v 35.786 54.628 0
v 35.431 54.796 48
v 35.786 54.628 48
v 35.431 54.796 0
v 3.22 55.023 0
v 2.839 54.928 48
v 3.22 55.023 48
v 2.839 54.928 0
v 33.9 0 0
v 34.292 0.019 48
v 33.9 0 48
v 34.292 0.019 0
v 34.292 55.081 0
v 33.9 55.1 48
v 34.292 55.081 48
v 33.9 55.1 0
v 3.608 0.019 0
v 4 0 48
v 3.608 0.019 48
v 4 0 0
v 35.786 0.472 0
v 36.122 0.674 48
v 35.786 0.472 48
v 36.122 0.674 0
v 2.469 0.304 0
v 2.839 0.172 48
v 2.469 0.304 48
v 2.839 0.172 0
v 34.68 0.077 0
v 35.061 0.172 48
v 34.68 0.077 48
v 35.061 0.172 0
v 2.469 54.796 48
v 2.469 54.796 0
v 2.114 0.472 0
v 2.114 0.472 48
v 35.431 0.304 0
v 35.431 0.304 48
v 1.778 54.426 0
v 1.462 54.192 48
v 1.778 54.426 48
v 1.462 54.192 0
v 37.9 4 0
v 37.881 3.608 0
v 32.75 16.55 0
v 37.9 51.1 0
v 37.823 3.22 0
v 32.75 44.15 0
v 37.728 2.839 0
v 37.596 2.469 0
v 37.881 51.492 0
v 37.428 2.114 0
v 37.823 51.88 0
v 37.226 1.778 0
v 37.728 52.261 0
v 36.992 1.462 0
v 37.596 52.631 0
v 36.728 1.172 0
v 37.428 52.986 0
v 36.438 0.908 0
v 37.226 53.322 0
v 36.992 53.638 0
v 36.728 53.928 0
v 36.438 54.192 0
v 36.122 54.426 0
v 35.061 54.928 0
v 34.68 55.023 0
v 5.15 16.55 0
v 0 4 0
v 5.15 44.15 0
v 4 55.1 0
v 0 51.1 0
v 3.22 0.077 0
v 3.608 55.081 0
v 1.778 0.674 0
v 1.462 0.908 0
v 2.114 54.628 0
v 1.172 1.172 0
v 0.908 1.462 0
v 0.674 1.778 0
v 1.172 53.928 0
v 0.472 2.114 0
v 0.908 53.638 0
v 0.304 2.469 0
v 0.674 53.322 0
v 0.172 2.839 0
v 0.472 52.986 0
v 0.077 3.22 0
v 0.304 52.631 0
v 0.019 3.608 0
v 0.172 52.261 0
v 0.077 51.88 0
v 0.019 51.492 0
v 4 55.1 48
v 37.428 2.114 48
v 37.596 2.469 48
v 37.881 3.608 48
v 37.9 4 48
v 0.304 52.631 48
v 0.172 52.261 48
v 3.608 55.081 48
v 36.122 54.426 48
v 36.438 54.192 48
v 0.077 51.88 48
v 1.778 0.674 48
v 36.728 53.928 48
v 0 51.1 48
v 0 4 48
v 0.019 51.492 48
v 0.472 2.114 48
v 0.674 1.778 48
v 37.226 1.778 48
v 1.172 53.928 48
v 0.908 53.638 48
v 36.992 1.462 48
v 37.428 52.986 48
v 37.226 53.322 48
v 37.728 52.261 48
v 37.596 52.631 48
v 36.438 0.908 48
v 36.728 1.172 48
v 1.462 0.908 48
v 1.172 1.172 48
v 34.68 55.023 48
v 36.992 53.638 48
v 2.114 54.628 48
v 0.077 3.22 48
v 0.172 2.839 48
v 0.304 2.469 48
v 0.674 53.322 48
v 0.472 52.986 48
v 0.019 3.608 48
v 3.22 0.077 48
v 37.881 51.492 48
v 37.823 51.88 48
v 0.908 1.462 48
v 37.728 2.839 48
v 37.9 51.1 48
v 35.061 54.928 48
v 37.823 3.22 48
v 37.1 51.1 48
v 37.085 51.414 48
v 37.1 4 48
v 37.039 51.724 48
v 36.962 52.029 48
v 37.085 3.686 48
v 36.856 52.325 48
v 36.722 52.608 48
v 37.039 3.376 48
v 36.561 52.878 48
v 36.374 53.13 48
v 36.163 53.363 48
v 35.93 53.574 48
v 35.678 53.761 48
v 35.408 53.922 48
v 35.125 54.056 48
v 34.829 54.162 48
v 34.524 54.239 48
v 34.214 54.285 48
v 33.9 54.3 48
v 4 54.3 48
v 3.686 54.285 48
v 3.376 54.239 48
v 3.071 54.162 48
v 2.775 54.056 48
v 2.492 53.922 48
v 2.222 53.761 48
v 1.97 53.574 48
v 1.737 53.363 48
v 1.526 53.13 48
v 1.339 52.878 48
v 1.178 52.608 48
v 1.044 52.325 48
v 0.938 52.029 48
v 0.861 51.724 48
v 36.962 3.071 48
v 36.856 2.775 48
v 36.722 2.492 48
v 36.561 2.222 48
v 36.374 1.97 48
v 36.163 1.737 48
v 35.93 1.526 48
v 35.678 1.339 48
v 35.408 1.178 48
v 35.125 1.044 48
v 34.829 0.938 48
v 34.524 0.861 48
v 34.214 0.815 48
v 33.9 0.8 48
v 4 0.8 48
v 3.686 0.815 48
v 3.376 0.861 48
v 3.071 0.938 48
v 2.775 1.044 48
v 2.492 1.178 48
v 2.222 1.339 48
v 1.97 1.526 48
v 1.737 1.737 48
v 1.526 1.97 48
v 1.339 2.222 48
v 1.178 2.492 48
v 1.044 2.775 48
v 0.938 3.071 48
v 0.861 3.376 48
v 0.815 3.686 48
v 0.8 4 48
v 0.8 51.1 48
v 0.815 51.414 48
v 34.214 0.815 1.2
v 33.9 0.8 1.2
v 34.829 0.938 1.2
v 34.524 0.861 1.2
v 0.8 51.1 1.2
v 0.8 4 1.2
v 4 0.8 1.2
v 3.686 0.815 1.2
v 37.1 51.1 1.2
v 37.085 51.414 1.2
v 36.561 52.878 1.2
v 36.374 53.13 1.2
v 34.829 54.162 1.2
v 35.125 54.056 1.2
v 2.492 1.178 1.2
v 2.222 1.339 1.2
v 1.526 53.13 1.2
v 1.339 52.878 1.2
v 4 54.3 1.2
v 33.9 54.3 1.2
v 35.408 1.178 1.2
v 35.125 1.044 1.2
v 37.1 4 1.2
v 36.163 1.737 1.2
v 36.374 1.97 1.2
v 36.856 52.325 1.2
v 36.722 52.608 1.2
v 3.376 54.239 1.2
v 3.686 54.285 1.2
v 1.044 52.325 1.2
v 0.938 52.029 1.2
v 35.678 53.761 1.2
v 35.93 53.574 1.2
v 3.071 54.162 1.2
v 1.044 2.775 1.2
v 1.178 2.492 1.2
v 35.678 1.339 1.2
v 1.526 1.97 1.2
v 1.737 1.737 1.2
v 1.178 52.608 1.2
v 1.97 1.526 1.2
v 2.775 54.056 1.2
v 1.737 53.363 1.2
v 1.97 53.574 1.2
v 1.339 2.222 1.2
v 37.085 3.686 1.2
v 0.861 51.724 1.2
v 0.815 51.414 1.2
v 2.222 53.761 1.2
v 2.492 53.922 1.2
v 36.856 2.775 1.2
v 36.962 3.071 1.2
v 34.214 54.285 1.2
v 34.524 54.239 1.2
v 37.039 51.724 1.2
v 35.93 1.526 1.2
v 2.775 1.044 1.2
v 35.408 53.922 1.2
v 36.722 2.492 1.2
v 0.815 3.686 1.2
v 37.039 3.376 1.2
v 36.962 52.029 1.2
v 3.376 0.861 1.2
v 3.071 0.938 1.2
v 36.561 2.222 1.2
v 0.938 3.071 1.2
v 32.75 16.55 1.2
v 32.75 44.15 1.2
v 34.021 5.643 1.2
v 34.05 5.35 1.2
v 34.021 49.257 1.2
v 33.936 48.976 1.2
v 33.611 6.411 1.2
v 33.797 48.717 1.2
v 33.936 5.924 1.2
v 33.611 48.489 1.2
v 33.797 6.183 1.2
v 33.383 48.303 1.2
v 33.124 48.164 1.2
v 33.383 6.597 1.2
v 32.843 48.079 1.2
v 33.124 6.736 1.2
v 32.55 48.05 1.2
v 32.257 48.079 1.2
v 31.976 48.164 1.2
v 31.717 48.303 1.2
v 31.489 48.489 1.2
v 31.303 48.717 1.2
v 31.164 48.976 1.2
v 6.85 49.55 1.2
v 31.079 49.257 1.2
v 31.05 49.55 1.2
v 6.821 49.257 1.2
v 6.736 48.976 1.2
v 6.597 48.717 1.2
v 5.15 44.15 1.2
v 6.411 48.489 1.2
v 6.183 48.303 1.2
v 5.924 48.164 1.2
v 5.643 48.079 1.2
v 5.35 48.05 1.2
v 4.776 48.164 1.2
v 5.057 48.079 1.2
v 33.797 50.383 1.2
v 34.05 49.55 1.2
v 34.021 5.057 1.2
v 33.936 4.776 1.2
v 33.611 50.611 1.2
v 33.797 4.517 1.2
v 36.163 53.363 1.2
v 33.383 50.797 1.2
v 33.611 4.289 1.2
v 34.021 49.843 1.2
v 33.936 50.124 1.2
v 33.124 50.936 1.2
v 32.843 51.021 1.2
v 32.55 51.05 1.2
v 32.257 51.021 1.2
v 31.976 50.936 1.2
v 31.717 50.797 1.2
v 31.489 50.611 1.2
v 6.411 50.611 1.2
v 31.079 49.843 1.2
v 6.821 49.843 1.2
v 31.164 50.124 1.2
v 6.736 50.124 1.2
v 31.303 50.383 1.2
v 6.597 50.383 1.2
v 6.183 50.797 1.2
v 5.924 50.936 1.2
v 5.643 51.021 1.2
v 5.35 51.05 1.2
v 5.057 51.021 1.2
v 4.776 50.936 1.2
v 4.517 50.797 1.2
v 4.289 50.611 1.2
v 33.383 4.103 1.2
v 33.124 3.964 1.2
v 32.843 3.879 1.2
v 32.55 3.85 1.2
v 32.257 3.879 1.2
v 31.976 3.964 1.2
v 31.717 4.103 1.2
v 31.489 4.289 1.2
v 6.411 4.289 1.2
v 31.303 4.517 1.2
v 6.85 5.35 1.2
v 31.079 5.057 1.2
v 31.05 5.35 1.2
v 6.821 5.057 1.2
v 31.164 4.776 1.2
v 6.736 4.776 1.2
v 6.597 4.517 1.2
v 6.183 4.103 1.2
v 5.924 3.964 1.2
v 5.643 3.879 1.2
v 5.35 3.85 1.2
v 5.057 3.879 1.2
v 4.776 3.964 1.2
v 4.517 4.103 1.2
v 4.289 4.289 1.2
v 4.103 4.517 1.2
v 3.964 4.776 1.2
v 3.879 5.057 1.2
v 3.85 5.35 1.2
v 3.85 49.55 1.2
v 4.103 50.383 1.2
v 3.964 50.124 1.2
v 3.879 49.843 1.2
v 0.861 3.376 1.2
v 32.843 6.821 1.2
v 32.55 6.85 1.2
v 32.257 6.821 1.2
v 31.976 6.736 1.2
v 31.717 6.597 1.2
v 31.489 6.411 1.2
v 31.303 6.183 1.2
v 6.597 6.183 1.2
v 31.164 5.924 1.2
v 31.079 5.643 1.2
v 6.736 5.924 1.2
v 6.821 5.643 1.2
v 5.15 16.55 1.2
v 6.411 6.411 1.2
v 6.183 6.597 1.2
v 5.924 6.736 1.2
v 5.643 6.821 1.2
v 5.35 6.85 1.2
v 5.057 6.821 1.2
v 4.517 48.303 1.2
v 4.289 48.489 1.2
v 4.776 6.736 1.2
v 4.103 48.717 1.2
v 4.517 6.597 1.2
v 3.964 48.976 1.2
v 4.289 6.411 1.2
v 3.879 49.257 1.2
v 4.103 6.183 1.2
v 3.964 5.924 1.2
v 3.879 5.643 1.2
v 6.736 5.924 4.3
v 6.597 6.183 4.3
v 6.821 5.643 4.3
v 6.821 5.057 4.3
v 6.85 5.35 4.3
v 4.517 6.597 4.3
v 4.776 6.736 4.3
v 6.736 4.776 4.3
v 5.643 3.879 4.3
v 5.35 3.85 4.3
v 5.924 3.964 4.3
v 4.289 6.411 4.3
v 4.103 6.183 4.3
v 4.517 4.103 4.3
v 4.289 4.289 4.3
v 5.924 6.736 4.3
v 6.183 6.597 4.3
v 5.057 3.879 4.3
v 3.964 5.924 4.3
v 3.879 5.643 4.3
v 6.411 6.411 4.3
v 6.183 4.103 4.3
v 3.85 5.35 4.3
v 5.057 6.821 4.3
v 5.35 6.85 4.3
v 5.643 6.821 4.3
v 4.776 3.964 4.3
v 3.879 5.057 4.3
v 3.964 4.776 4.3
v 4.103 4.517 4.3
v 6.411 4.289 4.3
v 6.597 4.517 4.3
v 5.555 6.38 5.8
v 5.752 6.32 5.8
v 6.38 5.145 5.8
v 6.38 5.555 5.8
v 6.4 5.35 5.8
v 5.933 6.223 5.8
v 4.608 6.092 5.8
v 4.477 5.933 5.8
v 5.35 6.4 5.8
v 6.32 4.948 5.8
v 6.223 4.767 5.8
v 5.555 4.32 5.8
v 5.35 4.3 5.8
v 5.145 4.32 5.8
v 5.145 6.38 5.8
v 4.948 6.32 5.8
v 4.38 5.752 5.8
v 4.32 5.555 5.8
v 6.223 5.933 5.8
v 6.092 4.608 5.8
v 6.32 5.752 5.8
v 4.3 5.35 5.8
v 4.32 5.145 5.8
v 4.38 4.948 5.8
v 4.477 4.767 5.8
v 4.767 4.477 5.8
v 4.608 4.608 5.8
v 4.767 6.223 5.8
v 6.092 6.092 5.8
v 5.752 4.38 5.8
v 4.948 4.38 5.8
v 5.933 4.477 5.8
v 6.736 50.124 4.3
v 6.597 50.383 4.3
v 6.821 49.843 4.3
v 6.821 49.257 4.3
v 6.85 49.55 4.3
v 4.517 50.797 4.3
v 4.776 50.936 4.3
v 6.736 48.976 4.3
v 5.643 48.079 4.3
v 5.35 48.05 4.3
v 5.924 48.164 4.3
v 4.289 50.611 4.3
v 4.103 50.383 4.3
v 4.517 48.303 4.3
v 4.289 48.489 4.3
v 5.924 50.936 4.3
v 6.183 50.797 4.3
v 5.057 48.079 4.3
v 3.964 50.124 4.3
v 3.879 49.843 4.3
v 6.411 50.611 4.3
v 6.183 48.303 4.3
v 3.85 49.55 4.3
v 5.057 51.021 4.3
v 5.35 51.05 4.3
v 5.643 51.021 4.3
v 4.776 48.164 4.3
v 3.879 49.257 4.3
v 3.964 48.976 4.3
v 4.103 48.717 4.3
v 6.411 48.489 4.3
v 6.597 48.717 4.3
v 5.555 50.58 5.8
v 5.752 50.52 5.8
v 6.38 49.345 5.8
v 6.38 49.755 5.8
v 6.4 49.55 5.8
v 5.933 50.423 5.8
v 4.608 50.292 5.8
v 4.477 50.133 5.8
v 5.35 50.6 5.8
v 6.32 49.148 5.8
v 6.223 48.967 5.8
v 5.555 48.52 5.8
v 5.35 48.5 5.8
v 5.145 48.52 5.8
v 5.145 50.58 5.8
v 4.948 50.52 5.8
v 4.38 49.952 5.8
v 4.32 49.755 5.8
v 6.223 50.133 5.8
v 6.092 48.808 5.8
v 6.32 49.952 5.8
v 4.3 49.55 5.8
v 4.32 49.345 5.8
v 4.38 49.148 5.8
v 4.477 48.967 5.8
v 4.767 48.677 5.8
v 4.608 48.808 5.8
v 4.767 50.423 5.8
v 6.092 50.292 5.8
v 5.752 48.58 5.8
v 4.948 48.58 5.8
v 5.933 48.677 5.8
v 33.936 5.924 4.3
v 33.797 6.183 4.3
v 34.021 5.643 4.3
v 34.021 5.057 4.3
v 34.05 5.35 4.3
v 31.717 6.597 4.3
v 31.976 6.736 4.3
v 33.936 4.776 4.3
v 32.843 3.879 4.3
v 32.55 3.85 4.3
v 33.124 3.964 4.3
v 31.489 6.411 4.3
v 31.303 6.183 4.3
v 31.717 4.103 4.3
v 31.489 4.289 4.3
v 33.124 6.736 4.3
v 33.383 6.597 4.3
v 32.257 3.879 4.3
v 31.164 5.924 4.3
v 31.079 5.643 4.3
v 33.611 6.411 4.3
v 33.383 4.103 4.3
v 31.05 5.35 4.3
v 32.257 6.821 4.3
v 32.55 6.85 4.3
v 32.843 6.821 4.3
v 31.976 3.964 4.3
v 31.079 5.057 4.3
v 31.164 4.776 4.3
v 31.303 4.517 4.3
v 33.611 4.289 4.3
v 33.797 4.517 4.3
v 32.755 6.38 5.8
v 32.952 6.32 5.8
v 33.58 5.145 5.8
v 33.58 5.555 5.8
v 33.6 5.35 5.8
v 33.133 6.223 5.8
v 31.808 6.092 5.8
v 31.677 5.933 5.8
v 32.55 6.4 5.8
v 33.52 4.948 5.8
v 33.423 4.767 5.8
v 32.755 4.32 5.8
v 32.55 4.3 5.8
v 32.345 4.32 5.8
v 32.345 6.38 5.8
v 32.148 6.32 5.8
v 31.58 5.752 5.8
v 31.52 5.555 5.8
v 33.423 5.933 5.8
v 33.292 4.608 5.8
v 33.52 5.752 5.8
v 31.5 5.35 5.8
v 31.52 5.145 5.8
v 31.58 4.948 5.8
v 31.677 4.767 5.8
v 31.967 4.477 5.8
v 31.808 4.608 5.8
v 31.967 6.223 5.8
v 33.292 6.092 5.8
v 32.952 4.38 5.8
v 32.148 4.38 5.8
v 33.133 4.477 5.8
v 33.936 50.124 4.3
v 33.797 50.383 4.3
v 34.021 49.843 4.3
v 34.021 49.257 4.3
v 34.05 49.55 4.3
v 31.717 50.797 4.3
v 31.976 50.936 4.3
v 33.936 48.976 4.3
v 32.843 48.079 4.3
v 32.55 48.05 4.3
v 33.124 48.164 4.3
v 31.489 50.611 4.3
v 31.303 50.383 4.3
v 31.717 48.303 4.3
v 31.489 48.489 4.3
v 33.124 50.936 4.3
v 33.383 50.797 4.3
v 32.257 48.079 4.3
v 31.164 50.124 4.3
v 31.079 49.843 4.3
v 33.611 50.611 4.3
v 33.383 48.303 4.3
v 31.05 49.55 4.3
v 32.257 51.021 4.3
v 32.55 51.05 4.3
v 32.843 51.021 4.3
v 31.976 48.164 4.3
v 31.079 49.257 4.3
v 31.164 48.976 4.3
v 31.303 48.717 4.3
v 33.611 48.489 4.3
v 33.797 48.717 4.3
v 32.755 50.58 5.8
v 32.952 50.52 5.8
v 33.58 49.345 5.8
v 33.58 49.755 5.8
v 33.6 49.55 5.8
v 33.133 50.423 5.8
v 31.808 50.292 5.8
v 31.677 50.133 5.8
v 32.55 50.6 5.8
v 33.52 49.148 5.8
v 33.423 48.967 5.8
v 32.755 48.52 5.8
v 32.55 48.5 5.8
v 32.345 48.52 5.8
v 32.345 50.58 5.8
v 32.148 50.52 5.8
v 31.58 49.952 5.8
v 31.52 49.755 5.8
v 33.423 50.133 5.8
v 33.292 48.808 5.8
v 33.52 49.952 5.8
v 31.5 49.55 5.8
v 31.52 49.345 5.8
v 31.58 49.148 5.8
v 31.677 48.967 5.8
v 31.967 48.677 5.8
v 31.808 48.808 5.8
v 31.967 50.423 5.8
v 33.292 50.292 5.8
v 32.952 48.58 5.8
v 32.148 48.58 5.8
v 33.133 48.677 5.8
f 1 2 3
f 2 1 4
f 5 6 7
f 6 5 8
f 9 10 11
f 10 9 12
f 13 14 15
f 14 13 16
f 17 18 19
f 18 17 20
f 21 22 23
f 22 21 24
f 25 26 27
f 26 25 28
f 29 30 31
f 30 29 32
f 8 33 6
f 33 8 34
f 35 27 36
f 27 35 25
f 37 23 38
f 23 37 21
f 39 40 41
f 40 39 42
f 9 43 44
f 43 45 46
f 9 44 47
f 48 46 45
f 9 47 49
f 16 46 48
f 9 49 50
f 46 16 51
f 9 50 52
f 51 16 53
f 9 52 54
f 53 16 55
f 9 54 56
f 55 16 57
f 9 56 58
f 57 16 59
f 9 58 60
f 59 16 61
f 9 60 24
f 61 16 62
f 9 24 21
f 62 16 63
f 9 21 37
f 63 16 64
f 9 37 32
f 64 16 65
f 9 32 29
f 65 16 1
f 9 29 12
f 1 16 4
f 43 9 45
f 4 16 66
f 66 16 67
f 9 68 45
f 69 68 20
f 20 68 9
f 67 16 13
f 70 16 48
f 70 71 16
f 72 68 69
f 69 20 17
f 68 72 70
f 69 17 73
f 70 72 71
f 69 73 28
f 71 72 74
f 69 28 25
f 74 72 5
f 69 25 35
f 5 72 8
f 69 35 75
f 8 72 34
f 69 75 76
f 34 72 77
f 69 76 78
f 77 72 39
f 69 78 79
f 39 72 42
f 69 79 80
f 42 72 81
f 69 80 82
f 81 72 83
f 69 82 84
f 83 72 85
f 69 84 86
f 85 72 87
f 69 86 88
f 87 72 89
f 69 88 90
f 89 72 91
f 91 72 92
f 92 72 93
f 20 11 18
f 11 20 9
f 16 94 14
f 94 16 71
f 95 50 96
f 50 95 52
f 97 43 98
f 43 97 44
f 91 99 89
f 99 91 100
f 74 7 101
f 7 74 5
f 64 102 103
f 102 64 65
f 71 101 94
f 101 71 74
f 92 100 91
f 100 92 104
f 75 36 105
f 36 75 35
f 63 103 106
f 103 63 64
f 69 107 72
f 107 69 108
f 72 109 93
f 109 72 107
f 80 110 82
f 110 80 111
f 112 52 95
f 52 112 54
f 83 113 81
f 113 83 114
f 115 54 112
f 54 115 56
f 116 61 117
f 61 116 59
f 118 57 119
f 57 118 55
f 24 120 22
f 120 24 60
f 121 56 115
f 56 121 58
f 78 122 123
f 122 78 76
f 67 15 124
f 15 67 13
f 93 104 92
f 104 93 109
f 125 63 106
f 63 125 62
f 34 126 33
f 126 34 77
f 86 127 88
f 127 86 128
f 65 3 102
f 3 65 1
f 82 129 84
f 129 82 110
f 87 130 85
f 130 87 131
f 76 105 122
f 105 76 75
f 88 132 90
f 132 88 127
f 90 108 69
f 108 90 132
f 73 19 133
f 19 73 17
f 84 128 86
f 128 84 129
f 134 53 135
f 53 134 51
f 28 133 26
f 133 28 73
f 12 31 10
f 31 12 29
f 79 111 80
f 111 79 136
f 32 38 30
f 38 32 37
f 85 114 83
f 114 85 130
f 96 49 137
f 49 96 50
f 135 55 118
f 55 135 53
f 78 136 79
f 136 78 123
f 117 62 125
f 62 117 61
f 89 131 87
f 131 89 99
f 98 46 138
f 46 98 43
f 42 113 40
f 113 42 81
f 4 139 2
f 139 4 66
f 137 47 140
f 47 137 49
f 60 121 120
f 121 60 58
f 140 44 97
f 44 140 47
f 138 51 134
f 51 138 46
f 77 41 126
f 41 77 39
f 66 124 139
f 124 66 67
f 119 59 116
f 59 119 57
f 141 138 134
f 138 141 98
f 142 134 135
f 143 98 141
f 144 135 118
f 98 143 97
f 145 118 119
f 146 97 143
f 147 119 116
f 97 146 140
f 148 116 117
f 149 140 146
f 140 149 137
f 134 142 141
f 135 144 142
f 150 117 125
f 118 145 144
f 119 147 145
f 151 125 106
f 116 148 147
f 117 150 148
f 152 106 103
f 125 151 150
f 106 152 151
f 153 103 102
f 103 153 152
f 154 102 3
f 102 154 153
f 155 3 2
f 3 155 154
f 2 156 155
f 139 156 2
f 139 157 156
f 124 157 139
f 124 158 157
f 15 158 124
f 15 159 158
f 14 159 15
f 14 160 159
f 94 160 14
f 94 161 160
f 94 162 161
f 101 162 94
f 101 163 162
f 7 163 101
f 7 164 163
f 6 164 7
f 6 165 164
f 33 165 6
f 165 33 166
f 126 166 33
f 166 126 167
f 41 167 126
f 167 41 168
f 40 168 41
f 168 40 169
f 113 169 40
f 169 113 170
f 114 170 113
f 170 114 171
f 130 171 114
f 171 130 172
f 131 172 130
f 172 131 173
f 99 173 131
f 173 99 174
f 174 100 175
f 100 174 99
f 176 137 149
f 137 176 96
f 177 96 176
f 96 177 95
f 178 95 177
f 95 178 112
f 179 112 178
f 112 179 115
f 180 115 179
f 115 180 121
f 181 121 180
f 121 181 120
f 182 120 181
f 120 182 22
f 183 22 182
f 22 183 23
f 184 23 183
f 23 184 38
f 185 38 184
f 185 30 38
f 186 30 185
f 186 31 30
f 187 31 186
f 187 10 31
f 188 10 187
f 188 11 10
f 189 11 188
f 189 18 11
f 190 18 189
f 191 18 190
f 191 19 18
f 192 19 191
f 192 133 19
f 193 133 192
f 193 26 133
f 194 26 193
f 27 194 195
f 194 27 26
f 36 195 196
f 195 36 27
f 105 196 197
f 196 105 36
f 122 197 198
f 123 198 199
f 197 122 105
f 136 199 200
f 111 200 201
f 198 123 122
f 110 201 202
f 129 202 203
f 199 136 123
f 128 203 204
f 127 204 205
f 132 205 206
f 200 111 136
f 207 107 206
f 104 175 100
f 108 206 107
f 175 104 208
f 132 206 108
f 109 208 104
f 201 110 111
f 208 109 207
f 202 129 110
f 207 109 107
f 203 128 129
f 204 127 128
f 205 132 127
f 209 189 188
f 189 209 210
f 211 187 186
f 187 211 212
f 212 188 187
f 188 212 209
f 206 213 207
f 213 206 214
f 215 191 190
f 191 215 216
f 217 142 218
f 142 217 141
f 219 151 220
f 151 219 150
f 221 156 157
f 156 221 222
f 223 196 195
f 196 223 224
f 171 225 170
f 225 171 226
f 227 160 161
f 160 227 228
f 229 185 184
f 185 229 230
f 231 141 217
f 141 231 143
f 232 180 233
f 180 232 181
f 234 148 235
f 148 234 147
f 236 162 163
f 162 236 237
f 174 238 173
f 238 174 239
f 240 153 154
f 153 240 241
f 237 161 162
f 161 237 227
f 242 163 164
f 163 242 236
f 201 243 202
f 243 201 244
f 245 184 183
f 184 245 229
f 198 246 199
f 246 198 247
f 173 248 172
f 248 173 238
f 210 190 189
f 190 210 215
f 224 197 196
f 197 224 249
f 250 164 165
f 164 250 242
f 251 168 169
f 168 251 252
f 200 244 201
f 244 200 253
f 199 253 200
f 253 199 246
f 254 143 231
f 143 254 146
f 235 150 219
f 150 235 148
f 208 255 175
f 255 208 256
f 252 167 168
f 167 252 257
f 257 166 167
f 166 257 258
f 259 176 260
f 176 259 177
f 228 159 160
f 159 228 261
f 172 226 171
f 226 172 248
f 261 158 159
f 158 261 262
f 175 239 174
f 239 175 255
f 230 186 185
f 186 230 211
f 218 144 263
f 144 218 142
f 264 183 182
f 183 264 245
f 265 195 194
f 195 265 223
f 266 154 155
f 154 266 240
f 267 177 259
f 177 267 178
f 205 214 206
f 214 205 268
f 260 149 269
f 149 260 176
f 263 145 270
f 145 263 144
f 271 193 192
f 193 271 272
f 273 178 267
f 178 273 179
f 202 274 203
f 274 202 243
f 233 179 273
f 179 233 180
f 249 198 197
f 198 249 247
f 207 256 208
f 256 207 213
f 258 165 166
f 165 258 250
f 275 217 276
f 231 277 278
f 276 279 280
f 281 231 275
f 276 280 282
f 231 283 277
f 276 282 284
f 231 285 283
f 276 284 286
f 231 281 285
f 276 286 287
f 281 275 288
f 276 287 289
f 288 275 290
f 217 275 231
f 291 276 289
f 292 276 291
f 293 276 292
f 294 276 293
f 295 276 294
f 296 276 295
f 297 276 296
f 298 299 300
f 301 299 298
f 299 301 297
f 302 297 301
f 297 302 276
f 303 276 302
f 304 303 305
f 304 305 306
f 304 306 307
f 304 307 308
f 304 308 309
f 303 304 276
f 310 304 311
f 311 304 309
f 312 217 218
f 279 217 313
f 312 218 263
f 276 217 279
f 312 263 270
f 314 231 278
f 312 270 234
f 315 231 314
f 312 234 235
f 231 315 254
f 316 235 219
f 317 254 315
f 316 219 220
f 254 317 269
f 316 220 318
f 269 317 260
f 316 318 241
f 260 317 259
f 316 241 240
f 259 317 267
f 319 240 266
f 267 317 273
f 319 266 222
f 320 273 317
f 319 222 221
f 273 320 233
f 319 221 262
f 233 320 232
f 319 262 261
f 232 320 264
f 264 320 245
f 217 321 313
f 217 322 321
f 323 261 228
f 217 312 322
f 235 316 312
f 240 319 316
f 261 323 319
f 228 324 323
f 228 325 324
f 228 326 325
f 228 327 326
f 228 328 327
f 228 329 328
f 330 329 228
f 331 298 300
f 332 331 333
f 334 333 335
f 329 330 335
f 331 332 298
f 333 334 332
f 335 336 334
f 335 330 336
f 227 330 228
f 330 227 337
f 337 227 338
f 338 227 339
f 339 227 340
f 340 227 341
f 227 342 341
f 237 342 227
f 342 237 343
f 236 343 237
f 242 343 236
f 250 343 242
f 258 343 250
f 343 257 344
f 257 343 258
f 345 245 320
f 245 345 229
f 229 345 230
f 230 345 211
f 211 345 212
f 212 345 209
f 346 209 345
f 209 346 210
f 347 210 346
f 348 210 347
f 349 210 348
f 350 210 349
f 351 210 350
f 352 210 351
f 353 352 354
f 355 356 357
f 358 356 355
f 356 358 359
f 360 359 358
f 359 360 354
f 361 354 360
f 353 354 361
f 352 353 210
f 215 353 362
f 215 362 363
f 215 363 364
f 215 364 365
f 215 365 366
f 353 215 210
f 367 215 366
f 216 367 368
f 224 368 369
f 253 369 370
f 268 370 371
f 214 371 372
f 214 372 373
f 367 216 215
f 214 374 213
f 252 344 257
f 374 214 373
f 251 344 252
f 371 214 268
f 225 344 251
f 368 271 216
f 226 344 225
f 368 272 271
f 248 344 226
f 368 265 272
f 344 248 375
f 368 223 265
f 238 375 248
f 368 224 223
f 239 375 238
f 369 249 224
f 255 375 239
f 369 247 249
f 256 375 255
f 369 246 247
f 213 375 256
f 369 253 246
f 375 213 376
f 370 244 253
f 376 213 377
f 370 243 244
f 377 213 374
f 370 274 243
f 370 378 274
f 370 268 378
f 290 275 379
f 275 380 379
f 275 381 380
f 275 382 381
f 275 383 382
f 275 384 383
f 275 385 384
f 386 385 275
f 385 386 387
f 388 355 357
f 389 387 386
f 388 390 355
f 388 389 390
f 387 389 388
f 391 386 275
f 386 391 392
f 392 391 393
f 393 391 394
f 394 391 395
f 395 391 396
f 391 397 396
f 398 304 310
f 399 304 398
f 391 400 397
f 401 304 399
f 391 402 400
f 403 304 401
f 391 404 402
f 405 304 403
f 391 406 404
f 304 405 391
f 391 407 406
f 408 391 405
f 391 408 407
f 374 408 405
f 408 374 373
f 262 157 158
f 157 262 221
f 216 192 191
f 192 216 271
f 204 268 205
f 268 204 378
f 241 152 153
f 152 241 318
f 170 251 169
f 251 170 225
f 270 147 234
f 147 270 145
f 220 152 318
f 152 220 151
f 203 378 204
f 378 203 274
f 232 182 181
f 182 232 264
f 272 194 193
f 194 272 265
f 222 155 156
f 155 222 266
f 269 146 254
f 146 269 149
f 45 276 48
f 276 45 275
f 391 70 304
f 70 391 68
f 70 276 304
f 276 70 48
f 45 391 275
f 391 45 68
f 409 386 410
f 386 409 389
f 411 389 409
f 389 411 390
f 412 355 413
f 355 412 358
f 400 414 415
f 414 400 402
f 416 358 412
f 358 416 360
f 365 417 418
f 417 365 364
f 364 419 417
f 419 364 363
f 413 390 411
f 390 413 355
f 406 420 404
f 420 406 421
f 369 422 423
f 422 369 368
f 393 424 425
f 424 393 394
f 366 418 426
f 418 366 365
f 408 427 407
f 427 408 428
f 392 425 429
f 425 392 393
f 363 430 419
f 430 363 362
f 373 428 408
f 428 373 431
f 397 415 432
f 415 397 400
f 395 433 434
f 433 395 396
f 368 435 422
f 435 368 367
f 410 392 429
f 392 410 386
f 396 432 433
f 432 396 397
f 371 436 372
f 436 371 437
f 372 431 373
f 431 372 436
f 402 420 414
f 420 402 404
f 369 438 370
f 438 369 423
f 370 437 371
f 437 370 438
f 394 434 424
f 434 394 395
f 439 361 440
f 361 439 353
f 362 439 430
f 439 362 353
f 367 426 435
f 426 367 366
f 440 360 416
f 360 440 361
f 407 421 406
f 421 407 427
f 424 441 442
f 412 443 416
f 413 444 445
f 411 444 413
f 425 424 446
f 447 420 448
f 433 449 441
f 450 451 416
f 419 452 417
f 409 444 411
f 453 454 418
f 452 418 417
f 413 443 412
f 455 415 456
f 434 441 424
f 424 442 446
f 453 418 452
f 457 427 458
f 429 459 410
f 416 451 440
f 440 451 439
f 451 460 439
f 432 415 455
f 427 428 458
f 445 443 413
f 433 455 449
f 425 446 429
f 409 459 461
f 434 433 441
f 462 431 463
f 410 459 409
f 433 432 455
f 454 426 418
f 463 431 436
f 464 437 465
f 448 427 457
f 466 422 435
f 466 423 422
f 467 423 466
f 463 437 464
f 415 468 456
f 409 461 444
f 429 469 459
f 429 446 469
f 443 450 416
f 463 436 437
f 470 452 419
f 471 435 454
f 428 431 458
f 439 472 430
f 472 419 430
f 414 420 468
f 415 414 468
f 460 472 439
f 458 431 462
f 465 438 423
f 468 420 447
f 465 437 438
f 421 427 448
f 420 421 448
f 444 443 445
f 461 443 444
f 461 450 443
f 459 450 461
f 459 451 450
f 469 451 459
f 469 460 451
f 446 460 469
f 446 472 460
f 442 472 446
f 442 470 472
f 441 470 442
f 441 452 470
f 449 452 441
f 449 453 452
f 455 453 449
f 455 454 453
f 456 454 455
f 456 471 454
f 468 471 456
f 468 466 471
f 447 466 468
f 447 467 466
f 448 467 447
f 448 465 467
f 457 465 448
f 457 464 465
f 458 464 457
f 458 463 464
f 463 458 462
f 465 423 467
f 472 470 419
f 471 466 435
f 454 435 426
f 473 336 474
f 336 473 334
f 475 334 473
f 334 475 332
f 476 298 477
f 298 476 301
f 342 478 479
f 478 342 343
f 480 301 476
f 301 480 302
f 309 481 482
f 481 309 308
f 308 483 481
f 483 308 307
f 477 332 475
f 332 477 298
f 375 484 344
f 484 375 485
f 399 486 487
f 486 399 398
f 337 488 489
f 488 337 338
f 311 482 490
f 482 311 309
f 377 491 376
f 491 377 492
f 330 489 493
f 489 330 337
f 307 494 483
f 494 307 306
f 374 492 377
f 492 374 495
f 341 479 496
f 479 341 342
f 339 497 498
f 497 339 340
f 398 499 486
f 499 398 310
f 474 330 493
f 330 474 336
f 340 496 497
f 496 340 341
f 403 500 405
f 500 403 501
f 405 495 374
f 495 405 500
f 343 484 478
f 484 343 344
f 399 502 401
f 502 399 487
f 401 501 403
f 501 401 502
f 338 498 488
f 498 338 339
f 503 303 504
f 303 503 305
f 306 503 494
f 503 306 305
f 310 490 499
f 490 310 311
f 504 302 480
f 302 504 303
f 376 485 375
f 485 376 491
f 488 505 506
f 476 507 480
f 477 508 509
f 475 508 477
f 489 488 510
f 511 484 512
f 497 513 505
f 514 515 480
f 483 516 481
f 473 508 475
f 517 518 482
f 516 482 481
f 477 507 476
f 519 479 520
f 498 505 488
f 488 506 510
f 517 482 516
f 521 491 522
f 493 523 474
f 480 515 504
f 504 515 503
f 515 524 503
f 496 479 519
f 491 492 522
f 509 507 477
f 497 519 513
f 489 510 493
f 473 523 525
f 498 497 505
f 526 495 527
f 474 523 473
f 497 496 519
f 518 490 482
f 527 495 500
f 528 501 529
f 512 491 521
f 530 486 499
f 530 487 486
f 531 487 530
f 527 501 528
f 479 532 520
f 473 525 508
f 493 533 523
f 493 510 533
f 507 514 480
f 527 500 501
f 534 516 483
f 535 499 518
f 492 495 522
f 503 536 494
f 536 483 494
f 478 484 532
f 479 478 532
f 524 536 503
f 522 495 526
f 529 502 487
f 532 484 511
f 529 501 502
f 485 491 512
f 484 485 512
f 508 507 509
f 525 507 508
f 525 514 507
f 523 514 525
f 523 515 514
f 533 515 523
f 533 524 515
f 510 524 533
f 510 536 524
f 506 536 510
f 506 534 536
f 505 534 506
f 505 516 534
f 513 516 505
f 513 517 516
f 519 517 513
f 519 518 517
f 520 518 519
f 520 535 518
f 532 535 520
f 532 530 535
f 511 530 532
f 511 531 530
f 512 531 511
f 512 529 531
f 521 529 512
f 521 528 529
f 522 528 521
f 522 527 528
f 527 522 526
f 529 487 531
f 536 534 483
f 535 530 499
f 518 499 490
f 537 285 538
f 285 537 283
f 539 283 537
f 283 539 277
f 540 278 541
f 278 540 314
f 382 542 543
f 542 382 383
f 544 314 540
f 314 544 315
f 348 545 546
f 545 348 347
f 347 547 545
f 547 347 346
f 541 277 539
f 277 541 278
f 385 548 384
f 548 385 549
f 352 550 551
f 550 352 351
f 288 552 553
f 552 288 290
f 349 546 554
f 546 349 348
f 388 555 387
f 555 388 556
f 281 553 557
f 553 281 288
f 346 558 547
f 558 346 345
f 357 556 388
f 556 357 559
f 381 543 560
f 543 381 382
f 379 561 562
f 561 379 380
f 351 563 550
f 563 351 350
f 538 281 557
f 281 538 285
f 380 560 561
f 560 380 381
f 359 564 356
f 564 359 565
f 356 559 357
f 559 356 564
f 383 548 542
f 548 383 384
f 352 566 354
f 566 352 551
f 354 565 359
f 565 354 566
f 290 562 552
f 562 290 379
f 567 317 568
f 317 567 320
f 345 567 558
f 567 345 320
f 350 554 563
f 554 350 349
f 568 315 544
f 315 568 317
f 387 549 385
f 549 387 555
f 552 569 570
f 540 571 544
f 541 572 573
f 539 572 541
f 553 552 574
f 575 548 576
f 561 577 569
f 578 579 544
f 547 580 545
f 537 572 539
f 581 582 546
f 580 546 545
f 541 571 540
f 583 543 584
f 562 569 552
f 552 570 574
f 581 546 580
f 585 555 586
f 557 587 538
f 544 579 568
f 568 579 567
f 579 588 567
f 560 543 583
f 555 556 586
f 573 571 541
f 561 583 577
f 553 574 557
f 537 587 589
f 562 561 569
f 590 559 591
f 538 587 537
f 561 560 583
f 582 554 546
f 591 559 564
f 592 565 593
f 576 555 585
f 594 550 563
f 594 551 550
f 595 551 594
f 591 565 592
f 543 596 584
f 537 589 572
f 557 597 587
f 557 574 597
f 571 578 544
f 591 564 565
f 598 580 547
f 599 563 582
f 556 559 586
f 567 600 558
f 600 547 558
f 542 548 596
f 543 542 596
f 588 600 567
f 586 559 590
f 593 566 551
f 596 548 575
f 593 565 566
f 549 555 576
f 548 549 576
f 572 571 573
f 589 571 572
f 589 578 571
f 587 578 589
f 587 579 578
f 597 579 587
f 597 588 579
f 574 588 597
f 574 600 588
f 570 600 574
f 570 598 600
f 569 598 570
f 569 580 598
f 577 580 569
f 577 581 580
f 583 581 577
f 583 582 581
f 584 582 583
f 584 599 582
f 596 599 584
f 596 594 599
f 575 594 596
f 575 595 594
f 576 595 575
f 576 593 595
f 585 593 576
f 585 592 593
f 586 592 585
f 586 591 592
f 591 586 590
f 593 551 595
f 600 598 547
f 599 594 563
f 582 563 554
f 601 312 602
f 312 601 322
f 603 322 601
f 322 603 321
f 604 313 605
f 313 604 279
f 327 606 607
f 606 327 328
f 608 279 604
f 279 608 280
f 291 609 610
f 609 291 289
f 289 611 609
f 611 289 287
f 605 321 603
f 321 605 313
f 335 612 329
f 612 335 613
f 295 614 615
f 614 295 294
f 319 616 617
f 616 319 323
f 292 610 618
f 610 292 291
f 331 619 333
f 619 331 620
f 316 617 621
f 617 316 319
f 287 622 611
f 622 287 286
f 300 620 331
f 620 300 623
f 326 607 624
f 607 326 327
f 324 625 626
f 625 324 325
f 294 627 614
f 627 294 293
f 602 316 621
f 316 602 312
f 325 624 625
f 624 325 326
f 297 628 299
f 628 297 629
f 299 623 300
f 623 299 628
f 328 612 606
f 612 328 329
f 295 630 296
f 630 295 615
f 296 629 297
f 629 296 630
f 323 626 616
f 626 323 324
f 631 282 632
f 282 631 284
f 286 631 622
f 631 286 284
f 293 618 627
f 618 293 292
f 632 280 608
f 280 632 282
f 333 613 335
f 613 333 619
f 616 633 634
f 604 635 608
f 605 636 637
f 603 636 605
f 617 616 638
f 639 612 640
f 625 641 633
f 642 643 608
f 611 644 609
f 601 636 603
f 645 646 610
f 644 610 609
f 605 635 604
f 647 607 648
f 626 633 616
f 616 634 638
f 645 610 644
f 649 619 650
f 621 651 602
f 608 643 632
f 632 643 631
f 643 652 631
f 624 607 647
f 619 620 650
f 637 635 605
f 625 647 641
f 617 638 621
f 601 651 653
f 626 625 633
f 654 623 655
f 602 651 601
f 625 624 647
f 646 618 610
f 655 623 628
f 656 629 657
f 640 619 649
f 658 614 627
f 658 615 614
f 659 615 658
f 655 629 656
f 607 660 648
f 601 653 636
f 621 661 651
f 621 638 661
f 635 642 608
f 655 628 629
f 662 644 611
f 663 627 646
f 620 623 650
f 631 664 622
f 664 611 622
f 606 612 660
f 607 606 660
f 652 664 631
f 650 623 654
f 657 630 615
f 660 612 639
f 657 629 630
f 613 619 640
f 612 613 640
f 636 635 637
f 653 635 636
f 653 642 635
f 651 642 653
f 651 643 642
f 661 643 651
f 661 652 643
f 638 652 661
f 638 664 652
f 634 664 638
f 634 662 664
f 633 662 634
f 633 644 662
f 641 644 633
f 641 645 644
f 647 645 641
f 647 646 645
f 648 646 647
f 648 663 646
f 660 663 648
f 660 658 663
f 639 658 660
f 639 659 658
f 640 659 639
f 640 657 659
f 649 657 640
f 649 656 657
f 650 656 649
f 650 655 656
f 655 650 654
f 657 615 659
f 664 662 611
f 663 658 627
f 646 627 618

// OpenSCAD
display_x = 32.8;
display_y = 50;
nozzle = 0.4;
wall = nozzle * 2;
print_margin = 0.15;
extra_space = 2;
outer_x = display_x + wall + print_margin * 2 + extra_space * 2;
outer_y = display_y + wall + print_margin * 2 + extra_space * 2;
inner_x = outer_x - 2 * wall;
inner_y = outer_y - 2 * wall;
outer_height_z = 48;
display_window = 27.6;
epsilon = 0.01;
window_y_offset = 2.8;
pin_diameter = 3;
pin_height = 5;
pin_y_top_offset = 5.4;
pin_y_bottom_offset = 11.2;
pin_corner_offset = 0.2;
pin_facets = 32;
corner_r = 4;
shell_fn = 64;
front_dome_r = 180;

module rounded_footprint(x, y, r) {
    offset(r = r, $fn = shell_fn)
        offset(r = -r)
            square([x, y]);
}

module outer_shell() {
    dome_z_offset = front_dome_r - sqrt(front_dome_r * front_dome_r - pow(min(outer_x, outer_y) / 2, 2));
    intersection() {
        translate([0, 0, -dome_z_offset])
            sphere(r = front_dome_r + outer_height_z, $fn = shell_fn * 2);
        linear_extrude(height = outer_height_z + dome_z_offset + 1)
            rounded_footprint(outer_x, outer_y, corner_r);
        cube([outer_x, outer_y, outer_height_z]);
    }
}

module inner_cavity() {
    translate([wall, wall, wall + nozzle])
        linear_extrude(height = outer_height_z)
            rounded_footprint(inner_x, inner_y, corner_r - wall);
}

module eink_window() {
    translate([
        (outer_x - display_window) / 2,
        ((outer_y - display_window) / 2) + window_y_offset,
        -epsilon
    ])
        cube([
            display_window,
            display_window,
            wall + 2 * epsilon + 0.5
        ]);
}

module chamfered_pin(d, h) {
    chamfer_height = h * 0.3;
    base_height = h - chamfer_height;
    cylinder(h = base_height, d = d, $fn = pin_facets);
    translate([0, 0, base_height])
        cylinder(h = chamfer_height, d1 = d, d2 = d * 0.7, $fn = pin_facets);
}

module pins() {
    window_x_left = (outer_x - display_window) / 2;
    window_x_right = (outer_x + display_window) / 2;
    window_y_bot = ((outer_y - display_window) / 2) + window_y_offset;
    window_y_top = ((outer_y + display_window) / 2) + window_y_offset;
    pin_x_left = window_x_left + pin_corner_offset;
    pin_x_right = window_x_right - pin_corner_offset;
    for (px = [pin_x_left, pin_x_right]) {
        translate([px, window_y_bot - pin_y_bottom_offset, wall])
            chamfered_pin(pin_diameter, pin_height);
        translate([px, window_y_top + pin_y_top_offset, wall])
            chamfered_pin(pin_diameter, pin_height);
    }
}

union() {
    difference() {
        outer_shell();
        inner_cavity();
        eink_window();
    }
    pins();
}
